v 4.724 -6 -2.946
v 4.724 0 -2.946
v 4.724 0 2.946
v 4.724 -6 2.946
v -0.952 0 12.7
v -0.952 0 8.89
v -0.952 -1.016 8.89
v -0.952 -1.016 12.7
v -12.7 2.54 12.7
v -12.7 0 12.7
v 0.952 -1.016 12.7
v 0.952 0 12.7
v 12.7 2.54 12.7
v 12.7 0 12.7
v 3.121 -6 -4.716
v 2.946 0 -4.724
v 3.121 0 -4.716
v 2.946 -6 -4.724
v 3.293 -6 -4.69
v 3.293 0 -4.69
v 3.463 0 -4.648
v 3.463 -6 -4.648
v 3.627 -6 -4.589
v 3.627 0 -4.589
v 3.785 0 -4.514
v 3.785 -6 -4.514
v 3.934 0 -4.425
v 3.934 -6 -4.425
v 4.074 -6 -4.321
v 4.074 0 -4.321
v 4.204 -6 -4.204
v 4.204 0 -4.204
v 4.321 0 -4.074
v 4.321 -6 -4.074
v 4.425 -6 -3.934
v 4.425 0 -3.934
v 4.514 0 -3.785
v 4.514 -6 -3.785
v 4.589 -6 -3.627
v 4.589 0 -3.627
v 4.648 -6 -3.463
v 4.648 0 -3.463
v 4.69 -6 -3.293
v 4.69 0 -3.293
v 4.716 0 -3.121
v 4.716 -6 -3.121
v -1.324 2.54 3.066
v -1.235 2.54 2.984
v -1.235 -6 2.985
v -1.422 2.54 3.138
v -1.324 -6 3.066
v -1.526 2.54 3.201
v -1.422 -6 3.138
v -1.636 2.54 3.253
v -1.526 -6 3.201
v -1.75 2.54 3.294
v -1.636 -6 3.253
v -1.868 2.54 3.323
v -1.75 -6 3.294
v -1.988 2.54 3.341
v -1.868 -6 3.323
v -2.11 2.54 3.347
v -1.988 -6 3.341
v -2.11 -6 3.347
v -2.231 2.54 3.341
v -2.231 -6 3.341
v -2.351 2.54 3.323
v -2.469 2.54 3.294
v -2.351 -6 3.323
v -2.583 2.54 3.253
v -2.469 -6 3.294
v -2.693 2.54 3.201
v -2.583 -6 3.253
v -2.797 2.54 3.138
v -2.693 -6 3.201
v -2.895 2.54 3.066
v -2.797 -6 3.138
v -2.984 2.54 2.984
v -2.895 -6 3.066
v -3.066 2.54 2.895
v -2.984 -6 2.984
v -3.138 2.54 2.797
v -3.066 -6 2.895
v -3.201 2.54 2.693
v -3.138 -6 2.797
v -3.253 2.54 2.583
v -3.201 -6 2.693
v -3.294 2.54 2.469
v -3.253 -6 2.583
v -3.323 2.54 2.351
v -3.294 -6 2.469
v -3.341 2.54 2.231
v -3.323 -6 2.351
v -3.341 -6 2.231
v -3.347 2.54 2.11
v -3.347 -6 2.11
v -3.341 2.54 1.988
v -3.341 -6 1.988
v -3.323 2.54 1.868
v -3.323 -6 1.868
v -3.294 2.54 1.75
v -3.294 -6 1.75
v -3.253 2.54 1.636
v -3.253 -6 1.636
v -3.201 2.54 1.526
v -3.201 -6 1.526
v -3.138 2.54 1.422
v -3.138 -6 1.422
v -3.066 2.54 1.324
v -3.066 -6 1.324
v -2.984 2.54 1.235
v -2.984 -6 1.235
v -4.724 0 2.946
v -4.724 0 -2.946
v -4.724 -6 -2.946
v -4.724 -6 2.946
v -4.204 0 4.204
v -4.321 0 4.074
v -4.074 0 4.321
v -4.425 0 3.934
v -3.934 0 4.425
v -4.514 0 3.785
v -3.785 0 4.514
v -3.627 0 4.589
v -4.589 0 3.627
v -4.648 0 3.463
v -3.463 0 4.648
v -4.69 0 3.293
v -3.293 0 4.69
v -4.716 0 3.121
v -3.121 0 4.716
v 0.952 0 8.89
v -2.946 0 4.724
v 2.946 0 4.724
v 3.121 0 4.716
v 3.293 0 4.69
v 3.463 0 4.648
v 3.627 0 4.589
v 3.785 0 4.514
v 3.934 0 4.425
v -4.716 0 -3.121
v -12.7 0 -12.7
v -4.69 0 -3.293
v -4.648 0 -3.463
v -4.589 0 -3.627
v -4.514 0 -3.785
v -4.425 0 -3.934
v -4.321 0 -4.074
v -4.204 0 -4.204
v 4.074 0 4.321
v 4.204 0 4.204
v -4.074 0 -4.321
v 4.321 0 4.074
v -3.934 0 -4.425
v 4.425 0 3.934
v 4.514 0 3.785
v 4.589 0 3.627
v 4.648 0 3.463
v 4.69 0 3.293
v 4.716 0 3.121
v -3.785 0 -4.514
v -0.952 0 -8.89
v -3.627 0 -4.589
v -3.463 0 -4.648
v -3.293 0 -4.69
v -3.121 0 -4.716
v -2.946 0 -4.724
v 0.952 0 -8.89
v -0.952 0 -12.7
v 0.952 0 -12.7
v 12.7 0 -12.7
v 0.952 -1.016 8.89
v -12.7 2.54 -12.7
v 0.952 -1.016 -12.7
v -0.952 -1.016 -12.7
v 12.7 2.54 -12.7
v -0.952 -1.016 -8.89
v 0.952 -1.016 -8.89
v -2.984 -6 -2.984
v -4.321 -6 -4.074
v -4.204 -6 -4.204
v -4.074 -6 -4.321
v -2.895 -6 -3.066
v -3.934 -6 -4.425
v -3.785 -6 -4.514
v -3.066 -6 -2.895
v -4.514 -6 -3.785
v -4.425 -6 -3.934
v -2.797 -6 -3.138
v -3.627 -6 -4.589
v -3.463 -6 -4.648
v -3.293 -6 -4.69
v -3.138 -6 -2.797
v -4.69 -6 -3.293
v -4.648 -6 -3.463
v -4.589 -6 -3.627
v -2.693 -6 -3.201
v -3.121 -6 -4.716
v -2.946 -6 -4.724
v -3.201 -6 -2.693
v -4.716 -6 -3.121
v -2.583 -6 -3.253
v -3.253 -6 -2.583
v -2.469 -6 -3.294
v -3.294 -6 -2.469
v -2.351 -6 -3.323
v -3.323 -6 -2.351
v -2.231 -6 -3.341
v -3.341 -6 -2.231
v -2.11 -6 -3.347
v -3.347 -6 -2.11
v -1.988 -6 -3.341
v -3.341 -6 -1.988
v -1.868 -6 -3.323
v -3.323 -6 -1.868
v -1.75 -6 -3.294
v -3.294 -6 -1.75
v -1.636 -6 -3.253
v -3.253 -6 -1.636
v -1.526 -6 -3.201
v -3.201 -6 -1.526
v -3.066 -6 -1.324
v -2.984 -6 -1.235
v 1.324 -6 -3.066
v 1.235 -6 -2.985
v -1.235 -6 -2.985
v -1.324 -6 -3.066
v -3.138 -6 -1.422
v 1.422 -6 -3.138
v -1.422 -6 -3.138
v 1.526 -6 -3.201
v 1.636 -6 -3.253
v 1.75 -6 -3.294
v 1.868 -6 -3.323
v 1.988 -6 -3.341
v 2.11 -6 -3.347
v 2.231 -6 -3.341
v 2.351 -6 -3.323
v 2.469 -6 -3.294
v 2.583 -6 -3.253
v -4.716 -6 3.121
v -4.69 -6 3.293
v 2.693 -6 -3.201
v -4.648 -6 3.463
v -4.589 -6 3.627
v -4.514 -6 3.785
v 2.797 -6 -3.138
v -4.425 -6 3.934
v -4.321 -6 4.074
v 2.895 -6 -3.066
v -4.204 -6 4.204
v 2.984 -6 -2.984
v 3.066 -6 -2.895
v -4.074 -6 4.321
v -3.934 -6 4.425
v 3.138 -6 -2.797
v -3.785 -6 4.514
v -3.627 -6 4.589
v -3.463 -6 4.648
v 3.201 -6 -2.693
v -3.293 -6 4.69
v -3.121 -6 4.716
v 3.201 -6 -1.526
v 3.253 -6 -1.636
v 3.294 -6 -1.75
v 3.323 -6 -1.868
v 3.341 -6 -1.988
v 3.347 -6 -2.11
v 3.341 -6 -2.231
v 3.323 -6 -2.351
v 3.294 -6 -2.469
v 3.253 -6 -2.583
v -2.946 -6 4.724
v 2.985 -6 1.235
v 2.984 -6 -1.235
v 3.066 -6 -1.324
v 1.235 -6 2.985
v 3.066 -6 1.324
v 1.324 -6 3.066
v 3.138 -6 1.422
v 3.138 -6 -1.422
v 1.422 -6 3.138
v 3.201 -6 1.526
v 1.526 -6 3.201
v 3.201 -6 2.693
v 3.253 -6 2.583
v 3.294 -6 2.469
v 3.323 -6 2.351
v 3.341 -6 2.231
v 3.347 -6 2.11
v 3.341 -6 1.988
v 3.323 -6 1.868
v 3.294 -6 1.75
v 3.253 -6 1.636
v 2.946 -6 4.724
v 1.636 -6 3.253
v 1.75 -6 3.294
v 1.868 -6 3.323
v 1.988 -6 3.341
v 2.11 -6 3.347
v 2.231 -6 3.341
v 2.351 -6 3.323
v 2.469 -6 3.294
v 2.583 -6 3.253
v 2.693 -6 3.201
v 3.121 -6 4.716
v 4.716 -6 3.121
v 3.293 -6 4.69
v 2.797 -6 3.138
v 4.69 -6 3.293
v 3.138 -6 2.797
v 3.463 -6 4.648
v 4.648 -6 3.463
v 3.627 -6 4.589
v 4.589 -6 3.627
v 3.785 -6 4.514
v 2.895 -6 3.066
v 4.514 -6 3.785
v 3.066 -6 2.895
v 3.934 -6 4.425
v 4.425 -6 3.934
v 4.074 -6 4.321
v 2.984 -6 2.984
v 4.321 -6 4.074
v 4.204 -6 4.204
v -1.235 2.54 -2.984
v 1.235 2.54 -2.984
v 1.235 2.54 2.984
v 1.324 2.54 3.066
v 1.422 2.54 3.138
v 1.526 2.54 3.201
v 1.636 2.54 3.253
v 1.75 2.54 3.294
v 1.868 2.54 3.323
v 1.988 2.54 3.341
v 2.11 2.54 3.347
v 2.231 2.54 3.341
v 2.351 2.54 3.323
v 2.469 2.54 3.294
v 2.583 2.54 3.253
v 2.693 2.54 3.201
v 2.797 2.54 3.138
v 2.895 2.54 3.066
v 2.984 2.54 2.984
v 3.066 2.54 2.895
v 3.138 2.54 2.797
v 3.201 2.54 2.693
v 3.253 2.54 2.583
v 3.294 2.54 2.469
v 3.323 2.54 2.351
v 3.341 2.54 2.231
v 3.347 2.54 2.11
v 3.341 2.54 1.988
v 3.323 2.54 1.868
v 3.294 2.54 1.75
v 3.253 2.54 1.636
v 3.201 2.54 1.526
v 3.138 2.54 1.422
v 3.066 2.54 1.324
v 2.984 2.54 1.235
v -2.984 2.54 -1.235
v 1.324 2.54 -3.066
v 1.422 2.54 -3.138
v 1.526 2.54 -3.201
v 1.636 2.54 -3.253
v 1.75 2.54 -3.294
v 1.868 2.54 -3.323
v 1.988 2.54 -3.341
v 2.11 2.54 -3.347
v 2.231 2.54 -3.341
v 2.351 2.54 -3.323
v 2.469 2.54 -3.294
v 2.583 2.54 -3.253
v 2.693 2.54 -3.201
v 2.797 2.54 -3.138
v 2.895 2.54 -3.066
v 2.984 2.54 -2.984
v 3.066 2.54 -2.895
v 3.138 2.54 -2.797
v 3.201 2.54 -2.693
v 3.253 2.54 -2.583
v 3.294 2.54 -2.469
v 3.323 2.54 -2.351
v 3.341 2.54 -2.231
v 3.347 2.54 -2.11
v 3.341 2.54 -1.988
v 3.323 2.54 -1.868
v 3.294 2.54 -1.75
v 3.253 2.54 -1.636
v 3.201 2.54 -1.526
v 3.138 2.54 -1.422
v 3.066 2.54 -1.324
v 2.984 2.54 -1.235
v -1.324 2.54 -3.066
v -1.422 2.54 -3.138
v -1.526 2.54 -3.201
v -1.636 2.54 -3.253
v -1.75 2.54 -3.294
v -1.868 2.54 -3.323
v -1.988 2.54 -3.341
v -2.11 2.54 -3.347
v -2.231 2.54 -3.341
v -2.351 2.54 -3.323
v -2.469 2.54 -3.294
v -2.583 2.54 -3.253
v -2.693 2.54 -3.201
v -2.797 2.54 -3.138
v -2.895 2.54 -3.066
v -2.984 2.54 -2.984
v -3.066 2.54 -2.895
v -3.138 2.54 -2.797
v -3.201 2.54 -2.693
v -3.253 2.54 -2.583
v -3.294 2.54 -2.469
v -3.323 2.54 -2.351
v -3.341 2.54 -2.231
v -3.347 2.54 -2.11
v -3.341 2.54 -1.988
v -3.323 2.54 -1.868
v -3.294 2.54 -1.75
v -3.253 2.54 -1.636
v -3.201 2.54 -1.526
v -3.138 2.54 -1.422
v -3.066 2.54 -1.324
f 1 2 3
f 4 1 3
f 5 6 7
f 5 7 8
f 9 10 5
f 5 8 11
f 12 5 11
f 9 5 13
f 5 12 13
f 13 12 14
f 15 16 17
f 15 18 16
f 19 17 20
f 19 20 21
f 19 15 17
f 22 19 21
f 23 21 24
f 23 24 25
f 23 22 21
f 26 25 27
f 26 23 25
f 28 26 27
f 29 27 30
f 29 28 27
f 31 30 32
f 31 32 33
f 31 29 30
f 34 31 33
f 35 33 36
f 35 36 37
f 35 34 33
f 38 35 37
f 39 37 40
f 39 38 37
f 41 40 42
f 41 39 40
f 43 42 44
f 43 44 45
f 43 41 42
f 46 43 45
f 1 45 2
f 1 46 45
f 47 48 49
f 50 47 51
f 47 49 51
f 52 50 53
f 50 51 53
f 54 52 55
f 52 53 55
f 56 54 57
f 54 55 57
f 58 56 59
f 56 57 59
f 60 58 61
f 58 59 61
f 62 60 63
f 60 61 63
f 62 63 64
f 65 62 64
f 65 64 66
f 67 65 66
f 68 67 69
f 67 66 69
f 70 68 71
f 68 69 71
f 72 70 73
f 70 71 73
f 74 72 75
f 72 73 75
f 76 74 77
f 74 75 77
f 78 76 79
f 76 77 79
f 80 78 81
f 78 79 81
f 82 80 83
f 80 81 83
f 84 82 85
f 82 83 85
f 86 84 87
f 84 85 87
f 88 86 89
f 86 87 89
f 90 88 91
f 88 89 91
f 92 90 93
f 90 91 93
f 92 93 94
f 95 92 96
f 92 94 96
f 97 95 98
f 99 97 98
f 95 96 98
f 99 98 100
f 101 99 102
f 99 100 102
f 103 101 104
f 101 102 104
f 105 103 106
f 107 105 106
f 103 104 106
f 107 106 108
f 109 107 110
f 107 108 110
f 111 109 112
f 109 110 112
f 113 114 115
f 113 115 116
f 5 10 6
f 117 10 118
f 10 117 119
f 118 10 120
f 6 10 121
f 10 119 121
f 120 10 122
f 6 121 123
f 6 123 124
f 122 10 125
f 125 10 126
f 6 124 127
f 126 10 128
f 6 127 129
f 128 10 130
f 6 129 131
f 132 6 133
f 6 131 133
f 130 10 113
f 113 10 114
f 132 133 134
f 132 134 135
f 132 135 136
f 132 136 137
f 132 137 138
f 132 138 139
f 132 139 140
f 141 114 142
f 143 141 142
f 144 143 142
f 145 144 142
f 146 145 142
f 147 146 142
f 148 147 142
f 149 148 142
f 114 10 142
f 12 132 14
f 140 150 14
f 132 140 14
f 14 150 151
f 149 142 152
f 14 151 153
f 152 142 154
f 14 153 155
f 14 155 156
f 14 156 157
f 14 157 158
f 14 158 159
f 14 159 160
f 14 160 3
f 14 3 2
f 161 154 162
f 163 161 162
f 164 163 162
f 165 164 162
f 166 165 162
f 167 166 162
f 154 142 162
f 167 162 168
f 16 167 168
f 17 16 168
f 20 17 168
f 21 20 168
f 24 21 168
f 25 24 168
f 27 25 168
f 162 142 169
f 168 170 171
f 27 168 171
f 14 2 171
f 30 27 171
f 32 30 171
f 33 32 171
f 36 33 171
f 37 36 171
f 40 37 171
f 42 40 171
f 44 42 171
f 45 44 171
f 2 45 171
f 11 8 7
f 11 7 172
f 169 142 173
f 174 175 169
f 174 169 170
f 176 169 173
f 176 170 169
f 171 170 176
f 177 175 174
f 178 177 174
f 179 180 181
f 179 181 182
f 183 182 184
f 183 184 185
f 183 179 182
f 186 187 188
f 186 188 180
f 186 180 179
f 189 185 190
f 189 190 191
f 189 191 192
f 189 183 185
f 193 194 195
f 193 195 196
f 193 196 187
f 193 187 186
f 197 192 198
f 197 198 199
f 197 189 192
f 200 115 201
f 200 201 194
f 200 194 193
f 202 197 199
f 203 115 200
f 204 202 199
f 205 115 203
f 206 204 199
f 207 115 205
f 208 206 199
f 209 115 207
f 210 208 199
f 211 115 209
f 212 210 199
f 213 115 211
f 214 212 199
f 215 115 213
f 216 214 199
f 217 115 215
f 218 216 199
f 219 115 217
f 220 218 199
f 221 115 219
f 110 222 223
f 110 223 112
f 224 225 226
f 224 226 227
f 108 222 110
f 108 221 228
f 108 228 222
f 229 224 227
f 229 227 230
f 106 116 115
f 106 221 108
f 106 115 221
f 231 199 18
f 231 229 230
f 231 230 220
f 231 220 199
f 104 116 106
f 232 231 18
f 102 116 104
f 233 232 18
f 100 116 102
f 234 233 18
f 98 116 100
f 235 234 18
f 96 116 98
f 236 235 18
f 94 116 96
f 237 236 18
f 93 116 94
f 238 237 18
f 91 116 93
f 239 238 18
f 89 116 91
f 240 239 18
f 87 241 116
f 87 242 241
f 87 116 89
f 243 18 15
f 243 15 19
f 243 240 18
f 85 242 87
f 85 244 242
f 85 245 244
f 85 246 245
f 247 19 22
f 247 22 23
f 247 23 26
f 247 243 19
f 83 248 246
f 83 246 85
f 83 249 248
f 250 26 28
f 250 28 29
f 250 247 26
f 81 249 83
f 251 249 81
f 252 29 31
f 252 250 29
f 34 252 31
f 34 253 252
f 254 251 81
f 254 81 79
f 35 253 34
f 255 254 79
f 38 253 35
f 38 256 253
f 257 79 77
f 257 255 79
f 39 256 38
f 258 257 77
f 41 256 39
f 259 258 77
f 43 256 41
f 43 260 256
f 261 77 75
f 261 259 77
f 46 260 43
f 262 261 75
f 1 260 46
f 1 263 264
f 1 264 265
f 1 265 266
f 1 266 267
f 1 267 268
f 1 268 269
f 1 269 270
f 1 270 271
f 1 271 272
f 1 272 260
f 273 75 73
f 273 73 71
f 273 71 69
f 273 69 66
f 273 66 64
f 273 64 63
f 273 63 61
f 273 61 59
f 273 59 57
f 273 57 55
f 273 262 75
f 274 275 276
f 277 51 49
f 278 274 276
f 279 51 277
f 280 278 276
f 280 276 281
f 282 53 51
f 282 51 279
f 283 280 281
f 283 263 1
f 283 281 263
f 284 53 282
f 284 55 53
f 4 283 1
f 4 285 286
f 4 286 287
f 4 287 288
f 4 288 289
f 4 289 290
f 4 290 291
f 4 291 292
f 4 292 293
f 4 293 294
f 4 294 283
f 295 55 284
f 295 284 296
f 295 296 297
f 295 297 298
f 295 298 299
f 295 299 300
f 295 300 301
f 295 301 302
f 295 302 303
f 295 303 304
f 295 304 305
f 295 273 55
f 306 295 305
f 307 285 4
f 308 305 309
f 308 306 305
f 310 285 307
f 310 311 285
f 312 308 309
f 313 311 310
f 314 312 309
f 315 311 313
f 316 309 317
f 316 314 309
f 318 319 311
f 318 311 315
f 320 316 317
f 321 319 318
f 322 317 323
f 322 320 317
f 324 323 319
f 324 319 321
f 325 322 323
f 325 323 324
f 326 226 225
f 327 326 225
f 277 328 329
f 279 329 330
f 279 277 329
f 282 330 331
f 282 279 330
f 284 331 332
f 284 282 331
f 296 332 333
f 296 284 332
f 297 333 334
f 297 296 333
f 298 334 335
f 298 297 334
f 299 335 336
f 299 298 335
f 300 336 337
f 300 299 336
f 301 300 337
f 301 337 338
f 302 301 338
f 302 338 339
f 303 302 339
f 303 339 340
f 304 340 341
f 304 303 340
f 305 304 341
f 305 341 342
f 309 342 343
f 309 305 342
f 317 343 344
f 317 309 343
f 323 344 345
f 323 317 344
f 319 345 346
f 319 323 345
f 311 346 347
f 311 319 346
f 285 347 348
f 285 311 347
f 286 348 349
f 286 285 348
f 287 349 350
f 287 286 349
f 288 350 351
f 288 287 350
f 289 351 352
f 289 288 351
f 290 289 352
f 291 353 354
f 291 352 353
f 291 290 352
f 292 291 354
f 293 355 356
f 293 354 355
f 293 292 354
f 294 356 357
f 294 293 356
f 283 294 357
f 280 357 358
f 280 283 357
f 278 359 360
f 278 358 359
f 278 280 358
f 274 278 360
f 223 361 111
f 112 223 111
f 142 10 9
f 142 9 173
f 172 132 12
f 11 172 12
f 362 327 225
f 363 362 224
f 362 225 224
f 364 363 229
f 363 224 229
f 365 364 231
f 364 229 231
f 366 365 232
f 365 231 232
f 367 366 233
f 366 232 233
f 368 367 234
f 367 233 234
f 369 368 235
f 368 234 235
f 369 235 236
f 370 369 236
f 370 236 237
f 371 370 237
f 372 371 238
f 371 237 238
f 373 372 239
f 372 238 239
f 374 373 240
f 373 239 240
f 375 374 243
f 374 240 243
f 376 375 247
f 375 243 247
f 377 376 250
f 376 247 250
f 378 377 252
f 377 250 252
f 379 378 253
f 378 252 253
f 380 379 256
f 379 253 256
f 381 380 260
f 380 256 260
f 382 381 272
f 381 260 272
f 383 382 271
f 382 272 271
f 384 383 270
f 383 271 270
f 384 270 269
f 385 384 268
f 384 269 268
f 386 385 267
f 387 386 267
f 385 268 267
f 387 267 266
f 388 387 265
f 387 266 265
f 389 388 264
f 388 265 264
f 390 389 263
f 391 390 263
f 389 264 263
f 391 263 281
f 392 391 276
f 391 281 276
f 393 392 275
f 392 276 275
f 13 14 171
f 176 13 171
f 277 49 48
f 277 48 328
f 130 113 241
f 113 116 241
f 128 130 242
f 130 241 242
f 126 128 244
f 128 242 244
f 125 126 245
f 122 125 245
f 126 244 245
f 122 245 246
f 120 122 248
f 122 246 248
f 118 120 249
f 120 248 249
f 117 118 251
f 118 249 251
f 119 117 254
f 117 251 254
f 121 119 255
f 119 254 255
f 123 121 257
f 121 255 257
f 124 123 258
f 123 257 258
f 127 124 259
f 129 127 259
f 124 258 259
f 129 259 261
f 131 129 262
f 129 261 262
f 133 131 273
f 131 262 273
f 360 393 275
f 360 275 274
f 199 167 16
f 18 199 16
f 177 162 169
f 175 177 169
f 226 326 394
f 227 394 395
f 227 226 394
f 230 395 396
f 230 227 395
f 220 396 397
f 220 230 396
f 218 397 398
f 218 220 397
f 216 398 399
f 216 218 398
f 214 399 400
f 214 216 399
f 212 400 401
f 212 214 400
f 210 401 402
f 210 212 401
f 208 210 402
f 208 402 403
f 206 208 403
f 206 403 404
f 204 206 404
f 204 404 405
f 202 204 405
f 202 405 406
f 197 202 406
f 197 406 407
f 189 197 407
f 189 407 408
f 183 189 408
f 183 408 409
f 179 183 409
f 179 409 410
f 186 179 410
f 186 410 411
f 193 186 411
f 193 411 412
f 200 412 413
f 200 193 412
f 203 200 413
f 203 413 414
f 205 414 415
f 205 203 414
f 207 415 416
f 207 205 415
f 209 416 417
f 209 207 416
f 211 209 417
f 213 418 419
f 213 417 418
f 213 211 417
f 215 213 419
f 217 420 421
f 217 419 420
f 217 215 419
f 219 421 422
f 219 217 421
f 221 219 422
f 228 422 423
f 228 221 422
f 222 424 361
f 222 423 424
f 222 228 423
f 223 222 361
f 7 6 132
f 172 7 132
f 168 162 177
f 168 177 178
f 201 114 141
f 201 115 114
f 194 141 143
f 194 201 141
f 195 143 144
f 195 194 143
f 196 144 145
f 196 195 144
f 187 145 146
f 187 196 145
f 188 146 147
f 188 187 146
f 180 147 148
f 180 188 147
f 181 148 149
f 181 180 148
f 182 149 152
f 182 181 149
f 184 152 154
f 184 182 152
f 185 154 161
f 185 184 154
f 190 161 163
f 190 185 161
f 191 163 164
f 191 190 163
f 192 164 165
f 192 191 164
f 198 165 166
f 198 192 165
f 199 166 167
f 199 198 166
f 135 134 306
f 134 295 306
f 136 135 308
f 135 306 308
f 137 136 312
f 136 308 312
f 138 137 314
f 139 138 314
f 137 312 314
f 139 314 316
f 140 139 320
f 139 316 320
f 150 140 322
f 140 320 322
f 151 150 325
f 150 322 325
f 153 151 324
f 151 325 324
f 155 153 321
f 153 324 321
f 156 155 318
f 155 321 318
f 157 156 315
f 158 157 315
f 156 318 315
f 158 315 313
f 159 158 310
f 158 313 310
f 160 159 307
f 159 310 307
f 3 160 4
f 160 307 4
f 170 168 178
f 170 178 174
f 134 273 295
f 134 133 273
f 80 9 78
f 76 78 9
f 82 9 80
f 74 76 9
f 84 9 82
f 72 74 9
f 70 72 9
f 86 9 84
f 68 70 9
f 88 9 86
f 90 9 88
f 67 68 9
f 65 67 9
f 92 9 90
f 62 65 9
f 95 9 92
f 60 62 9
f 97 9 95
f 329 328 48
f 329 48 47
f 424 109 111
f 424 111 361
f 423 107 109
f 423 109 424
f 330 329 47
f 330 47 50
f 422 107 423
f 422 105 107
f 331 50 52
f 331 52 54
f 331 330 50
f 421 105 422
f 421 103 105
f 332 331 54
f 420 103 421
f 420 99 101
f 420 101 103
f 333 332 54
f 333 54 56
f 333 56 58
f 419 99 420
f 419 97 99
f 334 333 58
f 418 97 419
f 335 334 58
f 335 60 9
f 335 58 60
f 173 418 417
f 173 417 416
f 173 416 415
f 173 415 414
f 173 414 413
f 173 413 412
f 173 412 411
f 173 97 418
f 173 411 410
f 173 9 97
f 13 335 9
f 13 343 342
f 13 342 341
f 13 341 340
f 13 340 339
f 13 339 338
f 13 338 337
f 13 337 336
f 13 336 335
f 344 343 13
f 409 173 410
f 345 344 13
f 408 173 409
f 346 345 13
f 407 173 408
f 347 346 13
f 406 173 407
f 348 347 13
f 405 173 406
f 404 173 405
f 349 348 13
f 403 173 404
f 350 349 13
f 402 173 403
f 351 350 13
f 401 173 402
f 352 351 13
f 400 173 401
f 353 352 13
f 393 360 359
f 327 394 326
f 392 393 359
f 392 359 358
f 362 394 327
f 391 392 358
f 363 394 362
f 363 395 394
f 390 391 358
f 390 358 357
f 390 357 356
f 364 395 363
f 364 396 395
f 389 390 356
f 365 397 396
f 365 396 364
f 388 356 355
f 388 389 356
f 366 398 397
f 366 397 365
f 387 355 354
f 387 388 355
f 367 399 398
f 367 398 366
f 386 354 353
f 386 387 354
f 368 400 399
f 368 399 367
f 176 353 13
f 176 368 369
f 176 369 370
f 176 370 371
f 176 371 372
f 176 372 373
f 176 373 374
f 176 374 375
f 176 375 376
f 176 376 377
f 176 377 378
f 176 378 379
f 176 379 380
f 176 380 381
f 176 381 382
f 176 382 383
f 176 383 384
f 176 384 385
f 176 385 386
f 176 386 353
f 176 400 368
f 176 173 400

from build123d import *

# Parameters (mm, degrees)
SKETCH1_W               = 25.4
SKETCH1_H               = 25.4
SKETCH1_W_2             = 5.969
SKETCH1_H_2             = 5.969
BOSS_EXTRUDE1_DEPTH     = 10.16
SKETCH2_W               = 1.905
SKETCH2_H               = 9.7155
BOSS_EXTRUDE2_DEPTH     = 1.016
SKETCH3_W               = 9.4488
SKETCH3_H               = 9.4488
SKETCH3_W_2             = 5.969
SKETCH3_H_2             = 5.969
BOSS_EXTRUDE3_DEPTH     = 6
CUT_EXTRUDE2_REACH      = 22.635
SKETCH4_W               = 1.905
SKETCH4_H               = 4.1656
SKETCH7_R               = 1.237436867
CUT_EXTRUDE5_DEPTH      = 25.160413904
MIRROR4_COPY_1_SKETCH_R = 1.237436867
MIRROR4_COPY_1_DEPTH    = 25.160413904
SKETCH6_W               = 25.4
SKETCH6_H               = 25.4
CUT_EXTRUDE4_DEPTH      = 7.62
FILLET1_R               = 1.778


with BuildPart() as part:
    # Sketch1 → Boss-Extrude1 (new body)
    with BuildSketch(Plane(origin=(0, 0, 0), x_dir=(1, 0, 0), z_dir=(0, 1, 0))):
        Rectangle(SKETCH1_W, SKETCH1_H)
        Rectangle(SKETCH1_W_2, SKETCH1_H_2, mode=Mode.SUBTRACT)
    extrude(amount=BOSS_EXTRUDE1_DEPTH)

    # Sketch2 → Boss-Extrude2 (add)
    with BuildSketch(Plane.XZ):
        with Locations((0, 7.84225)):
            Rectangle(SKETCH2_W, SKETCH2_H)
    boss_extrude2 = extrude(amount=BOSS_EXTRUDE2_DEPTH)

    # Mirror1: Boss-Extrude2 across plane
    add(boss_extrude2.mirror(Plane.XY))

    # Sketch3 → Boss-Extrude3 (add)
    with BuildSketch(Plane.XZ):
        Rectangle(SKETCH3_W, SKETCH3_H)
        Rectangle(SKETCH3_W_2, SKETCH3_H_2, mode=Mode.SUBTRACT)
    extrude(amount=BOSS_EXTRUDE3_DEPTH)

    # Sketch4 → Cut-Extrude2 (cut, up to next)
    with BuildSketch(Plane.XZ, mode=Mode.PRIVATE) as cut_extrude2_sk1:
        with Locations((0, 6.8072)):
            Rectangle(SKETCH4_W, SKETCH4_H)
    cut_extrude2_tool1 = extrude(cut_extrude2_sk1.sketch, amount=CUT_EXTRUDE2_REACH, mode=Mode.PRIVATE) & part.part
    # Sketch4 → Cut-Extrude2 (cut, up to next)
    with BuildSketch(Plane.XZ, mode=Mode.PRIVATE) as cut_extrude2_sk2:
        with Locations((0, -6.8072)):
            Rectangle(SKETCH4_W, SKETCH4_H)
    cut_extrude2_tool2 = extrude(cut_extrude2_sk2.sketch, amount=CUT_EXTRUDE2_REACH, mode=Mode.PRIVATE) & part.part
    add(cut_extrude2_tool1.solids().sort_by_distance((0, 0, 6.8072))[0], mode=Mode.SUBTRACT)
    add(cut_extrude2_tool2.solids().sort_by_distance((0, 0, -6.8072))[0], mode=Mode.SUBTRACT)

    # Sketch7 → Cut-Extrude5 (cut, through all)
    with BuildSketch(Plane.XZ.offset(6)):
        with Locations((-2.1095, 2.1095)):
            Circle(SKETCH7_R)
    cut_extrude5 = extrude(amount=-CUT_EXTRUDE5_DEPTH, mode=Mode.SUBTRACT)

    # Mirror3: Cut-Extrude5 across plane
    add(cut_extrude5.mirror(Plane(origin=(0, 0, 0), x_dir=(0, 0, 1), z_dir=(1, 0, 0))), mode=Mode.SUBTRACT)

    # Mirror4: Cut-Extrude5 across plane
    add(cut_extrude5.mirror(Plane.XY), mode=Mode.SUBTRACT)

    # Mirror4 copy 1 sketch → Mirror4 copy 1 (cut, through all)
    with BuildSketch(Plane(origin=(0, -6, 0), x_dir=(-1, 0, 0), z_dir=(0, -1, 0))):
        with Locations((-2.1095, 2.1095)):
            Circle(MIRROR4_COPY_1_SKETCH_R)
    extrude(amount=-MIRROR4_COPY_1_DEPTH, mode=Mode.SUBTRACT)

    # Sketch6 → Cut-Extrude4 (cut)
    with BuildSketch(Plane(origin=(0, 10.16, 0), x_dir=(1, 0, 0), z_dir=(0, 1, 0))):
        Rectangle(SKETCH6_W, SKETCH6_H)
    extrude(amount=-CUT_EXTRUDE4_DEPTH, mode=Mode.SUBTRACT)

    # Fillet1
    fillet1_edges = [part.edges().sort_by_distance(p)[0] for p in [
        (4.7244, -3, 4.7244),
        (-4.7244, -3, 4.7244),
        (-4.7244, -3, -4.7244),
        (4.7244, -3, -4.7244),
    ]]
    fillet(fillet1_edges, radius=FILLET1_R)


solid = part.part
